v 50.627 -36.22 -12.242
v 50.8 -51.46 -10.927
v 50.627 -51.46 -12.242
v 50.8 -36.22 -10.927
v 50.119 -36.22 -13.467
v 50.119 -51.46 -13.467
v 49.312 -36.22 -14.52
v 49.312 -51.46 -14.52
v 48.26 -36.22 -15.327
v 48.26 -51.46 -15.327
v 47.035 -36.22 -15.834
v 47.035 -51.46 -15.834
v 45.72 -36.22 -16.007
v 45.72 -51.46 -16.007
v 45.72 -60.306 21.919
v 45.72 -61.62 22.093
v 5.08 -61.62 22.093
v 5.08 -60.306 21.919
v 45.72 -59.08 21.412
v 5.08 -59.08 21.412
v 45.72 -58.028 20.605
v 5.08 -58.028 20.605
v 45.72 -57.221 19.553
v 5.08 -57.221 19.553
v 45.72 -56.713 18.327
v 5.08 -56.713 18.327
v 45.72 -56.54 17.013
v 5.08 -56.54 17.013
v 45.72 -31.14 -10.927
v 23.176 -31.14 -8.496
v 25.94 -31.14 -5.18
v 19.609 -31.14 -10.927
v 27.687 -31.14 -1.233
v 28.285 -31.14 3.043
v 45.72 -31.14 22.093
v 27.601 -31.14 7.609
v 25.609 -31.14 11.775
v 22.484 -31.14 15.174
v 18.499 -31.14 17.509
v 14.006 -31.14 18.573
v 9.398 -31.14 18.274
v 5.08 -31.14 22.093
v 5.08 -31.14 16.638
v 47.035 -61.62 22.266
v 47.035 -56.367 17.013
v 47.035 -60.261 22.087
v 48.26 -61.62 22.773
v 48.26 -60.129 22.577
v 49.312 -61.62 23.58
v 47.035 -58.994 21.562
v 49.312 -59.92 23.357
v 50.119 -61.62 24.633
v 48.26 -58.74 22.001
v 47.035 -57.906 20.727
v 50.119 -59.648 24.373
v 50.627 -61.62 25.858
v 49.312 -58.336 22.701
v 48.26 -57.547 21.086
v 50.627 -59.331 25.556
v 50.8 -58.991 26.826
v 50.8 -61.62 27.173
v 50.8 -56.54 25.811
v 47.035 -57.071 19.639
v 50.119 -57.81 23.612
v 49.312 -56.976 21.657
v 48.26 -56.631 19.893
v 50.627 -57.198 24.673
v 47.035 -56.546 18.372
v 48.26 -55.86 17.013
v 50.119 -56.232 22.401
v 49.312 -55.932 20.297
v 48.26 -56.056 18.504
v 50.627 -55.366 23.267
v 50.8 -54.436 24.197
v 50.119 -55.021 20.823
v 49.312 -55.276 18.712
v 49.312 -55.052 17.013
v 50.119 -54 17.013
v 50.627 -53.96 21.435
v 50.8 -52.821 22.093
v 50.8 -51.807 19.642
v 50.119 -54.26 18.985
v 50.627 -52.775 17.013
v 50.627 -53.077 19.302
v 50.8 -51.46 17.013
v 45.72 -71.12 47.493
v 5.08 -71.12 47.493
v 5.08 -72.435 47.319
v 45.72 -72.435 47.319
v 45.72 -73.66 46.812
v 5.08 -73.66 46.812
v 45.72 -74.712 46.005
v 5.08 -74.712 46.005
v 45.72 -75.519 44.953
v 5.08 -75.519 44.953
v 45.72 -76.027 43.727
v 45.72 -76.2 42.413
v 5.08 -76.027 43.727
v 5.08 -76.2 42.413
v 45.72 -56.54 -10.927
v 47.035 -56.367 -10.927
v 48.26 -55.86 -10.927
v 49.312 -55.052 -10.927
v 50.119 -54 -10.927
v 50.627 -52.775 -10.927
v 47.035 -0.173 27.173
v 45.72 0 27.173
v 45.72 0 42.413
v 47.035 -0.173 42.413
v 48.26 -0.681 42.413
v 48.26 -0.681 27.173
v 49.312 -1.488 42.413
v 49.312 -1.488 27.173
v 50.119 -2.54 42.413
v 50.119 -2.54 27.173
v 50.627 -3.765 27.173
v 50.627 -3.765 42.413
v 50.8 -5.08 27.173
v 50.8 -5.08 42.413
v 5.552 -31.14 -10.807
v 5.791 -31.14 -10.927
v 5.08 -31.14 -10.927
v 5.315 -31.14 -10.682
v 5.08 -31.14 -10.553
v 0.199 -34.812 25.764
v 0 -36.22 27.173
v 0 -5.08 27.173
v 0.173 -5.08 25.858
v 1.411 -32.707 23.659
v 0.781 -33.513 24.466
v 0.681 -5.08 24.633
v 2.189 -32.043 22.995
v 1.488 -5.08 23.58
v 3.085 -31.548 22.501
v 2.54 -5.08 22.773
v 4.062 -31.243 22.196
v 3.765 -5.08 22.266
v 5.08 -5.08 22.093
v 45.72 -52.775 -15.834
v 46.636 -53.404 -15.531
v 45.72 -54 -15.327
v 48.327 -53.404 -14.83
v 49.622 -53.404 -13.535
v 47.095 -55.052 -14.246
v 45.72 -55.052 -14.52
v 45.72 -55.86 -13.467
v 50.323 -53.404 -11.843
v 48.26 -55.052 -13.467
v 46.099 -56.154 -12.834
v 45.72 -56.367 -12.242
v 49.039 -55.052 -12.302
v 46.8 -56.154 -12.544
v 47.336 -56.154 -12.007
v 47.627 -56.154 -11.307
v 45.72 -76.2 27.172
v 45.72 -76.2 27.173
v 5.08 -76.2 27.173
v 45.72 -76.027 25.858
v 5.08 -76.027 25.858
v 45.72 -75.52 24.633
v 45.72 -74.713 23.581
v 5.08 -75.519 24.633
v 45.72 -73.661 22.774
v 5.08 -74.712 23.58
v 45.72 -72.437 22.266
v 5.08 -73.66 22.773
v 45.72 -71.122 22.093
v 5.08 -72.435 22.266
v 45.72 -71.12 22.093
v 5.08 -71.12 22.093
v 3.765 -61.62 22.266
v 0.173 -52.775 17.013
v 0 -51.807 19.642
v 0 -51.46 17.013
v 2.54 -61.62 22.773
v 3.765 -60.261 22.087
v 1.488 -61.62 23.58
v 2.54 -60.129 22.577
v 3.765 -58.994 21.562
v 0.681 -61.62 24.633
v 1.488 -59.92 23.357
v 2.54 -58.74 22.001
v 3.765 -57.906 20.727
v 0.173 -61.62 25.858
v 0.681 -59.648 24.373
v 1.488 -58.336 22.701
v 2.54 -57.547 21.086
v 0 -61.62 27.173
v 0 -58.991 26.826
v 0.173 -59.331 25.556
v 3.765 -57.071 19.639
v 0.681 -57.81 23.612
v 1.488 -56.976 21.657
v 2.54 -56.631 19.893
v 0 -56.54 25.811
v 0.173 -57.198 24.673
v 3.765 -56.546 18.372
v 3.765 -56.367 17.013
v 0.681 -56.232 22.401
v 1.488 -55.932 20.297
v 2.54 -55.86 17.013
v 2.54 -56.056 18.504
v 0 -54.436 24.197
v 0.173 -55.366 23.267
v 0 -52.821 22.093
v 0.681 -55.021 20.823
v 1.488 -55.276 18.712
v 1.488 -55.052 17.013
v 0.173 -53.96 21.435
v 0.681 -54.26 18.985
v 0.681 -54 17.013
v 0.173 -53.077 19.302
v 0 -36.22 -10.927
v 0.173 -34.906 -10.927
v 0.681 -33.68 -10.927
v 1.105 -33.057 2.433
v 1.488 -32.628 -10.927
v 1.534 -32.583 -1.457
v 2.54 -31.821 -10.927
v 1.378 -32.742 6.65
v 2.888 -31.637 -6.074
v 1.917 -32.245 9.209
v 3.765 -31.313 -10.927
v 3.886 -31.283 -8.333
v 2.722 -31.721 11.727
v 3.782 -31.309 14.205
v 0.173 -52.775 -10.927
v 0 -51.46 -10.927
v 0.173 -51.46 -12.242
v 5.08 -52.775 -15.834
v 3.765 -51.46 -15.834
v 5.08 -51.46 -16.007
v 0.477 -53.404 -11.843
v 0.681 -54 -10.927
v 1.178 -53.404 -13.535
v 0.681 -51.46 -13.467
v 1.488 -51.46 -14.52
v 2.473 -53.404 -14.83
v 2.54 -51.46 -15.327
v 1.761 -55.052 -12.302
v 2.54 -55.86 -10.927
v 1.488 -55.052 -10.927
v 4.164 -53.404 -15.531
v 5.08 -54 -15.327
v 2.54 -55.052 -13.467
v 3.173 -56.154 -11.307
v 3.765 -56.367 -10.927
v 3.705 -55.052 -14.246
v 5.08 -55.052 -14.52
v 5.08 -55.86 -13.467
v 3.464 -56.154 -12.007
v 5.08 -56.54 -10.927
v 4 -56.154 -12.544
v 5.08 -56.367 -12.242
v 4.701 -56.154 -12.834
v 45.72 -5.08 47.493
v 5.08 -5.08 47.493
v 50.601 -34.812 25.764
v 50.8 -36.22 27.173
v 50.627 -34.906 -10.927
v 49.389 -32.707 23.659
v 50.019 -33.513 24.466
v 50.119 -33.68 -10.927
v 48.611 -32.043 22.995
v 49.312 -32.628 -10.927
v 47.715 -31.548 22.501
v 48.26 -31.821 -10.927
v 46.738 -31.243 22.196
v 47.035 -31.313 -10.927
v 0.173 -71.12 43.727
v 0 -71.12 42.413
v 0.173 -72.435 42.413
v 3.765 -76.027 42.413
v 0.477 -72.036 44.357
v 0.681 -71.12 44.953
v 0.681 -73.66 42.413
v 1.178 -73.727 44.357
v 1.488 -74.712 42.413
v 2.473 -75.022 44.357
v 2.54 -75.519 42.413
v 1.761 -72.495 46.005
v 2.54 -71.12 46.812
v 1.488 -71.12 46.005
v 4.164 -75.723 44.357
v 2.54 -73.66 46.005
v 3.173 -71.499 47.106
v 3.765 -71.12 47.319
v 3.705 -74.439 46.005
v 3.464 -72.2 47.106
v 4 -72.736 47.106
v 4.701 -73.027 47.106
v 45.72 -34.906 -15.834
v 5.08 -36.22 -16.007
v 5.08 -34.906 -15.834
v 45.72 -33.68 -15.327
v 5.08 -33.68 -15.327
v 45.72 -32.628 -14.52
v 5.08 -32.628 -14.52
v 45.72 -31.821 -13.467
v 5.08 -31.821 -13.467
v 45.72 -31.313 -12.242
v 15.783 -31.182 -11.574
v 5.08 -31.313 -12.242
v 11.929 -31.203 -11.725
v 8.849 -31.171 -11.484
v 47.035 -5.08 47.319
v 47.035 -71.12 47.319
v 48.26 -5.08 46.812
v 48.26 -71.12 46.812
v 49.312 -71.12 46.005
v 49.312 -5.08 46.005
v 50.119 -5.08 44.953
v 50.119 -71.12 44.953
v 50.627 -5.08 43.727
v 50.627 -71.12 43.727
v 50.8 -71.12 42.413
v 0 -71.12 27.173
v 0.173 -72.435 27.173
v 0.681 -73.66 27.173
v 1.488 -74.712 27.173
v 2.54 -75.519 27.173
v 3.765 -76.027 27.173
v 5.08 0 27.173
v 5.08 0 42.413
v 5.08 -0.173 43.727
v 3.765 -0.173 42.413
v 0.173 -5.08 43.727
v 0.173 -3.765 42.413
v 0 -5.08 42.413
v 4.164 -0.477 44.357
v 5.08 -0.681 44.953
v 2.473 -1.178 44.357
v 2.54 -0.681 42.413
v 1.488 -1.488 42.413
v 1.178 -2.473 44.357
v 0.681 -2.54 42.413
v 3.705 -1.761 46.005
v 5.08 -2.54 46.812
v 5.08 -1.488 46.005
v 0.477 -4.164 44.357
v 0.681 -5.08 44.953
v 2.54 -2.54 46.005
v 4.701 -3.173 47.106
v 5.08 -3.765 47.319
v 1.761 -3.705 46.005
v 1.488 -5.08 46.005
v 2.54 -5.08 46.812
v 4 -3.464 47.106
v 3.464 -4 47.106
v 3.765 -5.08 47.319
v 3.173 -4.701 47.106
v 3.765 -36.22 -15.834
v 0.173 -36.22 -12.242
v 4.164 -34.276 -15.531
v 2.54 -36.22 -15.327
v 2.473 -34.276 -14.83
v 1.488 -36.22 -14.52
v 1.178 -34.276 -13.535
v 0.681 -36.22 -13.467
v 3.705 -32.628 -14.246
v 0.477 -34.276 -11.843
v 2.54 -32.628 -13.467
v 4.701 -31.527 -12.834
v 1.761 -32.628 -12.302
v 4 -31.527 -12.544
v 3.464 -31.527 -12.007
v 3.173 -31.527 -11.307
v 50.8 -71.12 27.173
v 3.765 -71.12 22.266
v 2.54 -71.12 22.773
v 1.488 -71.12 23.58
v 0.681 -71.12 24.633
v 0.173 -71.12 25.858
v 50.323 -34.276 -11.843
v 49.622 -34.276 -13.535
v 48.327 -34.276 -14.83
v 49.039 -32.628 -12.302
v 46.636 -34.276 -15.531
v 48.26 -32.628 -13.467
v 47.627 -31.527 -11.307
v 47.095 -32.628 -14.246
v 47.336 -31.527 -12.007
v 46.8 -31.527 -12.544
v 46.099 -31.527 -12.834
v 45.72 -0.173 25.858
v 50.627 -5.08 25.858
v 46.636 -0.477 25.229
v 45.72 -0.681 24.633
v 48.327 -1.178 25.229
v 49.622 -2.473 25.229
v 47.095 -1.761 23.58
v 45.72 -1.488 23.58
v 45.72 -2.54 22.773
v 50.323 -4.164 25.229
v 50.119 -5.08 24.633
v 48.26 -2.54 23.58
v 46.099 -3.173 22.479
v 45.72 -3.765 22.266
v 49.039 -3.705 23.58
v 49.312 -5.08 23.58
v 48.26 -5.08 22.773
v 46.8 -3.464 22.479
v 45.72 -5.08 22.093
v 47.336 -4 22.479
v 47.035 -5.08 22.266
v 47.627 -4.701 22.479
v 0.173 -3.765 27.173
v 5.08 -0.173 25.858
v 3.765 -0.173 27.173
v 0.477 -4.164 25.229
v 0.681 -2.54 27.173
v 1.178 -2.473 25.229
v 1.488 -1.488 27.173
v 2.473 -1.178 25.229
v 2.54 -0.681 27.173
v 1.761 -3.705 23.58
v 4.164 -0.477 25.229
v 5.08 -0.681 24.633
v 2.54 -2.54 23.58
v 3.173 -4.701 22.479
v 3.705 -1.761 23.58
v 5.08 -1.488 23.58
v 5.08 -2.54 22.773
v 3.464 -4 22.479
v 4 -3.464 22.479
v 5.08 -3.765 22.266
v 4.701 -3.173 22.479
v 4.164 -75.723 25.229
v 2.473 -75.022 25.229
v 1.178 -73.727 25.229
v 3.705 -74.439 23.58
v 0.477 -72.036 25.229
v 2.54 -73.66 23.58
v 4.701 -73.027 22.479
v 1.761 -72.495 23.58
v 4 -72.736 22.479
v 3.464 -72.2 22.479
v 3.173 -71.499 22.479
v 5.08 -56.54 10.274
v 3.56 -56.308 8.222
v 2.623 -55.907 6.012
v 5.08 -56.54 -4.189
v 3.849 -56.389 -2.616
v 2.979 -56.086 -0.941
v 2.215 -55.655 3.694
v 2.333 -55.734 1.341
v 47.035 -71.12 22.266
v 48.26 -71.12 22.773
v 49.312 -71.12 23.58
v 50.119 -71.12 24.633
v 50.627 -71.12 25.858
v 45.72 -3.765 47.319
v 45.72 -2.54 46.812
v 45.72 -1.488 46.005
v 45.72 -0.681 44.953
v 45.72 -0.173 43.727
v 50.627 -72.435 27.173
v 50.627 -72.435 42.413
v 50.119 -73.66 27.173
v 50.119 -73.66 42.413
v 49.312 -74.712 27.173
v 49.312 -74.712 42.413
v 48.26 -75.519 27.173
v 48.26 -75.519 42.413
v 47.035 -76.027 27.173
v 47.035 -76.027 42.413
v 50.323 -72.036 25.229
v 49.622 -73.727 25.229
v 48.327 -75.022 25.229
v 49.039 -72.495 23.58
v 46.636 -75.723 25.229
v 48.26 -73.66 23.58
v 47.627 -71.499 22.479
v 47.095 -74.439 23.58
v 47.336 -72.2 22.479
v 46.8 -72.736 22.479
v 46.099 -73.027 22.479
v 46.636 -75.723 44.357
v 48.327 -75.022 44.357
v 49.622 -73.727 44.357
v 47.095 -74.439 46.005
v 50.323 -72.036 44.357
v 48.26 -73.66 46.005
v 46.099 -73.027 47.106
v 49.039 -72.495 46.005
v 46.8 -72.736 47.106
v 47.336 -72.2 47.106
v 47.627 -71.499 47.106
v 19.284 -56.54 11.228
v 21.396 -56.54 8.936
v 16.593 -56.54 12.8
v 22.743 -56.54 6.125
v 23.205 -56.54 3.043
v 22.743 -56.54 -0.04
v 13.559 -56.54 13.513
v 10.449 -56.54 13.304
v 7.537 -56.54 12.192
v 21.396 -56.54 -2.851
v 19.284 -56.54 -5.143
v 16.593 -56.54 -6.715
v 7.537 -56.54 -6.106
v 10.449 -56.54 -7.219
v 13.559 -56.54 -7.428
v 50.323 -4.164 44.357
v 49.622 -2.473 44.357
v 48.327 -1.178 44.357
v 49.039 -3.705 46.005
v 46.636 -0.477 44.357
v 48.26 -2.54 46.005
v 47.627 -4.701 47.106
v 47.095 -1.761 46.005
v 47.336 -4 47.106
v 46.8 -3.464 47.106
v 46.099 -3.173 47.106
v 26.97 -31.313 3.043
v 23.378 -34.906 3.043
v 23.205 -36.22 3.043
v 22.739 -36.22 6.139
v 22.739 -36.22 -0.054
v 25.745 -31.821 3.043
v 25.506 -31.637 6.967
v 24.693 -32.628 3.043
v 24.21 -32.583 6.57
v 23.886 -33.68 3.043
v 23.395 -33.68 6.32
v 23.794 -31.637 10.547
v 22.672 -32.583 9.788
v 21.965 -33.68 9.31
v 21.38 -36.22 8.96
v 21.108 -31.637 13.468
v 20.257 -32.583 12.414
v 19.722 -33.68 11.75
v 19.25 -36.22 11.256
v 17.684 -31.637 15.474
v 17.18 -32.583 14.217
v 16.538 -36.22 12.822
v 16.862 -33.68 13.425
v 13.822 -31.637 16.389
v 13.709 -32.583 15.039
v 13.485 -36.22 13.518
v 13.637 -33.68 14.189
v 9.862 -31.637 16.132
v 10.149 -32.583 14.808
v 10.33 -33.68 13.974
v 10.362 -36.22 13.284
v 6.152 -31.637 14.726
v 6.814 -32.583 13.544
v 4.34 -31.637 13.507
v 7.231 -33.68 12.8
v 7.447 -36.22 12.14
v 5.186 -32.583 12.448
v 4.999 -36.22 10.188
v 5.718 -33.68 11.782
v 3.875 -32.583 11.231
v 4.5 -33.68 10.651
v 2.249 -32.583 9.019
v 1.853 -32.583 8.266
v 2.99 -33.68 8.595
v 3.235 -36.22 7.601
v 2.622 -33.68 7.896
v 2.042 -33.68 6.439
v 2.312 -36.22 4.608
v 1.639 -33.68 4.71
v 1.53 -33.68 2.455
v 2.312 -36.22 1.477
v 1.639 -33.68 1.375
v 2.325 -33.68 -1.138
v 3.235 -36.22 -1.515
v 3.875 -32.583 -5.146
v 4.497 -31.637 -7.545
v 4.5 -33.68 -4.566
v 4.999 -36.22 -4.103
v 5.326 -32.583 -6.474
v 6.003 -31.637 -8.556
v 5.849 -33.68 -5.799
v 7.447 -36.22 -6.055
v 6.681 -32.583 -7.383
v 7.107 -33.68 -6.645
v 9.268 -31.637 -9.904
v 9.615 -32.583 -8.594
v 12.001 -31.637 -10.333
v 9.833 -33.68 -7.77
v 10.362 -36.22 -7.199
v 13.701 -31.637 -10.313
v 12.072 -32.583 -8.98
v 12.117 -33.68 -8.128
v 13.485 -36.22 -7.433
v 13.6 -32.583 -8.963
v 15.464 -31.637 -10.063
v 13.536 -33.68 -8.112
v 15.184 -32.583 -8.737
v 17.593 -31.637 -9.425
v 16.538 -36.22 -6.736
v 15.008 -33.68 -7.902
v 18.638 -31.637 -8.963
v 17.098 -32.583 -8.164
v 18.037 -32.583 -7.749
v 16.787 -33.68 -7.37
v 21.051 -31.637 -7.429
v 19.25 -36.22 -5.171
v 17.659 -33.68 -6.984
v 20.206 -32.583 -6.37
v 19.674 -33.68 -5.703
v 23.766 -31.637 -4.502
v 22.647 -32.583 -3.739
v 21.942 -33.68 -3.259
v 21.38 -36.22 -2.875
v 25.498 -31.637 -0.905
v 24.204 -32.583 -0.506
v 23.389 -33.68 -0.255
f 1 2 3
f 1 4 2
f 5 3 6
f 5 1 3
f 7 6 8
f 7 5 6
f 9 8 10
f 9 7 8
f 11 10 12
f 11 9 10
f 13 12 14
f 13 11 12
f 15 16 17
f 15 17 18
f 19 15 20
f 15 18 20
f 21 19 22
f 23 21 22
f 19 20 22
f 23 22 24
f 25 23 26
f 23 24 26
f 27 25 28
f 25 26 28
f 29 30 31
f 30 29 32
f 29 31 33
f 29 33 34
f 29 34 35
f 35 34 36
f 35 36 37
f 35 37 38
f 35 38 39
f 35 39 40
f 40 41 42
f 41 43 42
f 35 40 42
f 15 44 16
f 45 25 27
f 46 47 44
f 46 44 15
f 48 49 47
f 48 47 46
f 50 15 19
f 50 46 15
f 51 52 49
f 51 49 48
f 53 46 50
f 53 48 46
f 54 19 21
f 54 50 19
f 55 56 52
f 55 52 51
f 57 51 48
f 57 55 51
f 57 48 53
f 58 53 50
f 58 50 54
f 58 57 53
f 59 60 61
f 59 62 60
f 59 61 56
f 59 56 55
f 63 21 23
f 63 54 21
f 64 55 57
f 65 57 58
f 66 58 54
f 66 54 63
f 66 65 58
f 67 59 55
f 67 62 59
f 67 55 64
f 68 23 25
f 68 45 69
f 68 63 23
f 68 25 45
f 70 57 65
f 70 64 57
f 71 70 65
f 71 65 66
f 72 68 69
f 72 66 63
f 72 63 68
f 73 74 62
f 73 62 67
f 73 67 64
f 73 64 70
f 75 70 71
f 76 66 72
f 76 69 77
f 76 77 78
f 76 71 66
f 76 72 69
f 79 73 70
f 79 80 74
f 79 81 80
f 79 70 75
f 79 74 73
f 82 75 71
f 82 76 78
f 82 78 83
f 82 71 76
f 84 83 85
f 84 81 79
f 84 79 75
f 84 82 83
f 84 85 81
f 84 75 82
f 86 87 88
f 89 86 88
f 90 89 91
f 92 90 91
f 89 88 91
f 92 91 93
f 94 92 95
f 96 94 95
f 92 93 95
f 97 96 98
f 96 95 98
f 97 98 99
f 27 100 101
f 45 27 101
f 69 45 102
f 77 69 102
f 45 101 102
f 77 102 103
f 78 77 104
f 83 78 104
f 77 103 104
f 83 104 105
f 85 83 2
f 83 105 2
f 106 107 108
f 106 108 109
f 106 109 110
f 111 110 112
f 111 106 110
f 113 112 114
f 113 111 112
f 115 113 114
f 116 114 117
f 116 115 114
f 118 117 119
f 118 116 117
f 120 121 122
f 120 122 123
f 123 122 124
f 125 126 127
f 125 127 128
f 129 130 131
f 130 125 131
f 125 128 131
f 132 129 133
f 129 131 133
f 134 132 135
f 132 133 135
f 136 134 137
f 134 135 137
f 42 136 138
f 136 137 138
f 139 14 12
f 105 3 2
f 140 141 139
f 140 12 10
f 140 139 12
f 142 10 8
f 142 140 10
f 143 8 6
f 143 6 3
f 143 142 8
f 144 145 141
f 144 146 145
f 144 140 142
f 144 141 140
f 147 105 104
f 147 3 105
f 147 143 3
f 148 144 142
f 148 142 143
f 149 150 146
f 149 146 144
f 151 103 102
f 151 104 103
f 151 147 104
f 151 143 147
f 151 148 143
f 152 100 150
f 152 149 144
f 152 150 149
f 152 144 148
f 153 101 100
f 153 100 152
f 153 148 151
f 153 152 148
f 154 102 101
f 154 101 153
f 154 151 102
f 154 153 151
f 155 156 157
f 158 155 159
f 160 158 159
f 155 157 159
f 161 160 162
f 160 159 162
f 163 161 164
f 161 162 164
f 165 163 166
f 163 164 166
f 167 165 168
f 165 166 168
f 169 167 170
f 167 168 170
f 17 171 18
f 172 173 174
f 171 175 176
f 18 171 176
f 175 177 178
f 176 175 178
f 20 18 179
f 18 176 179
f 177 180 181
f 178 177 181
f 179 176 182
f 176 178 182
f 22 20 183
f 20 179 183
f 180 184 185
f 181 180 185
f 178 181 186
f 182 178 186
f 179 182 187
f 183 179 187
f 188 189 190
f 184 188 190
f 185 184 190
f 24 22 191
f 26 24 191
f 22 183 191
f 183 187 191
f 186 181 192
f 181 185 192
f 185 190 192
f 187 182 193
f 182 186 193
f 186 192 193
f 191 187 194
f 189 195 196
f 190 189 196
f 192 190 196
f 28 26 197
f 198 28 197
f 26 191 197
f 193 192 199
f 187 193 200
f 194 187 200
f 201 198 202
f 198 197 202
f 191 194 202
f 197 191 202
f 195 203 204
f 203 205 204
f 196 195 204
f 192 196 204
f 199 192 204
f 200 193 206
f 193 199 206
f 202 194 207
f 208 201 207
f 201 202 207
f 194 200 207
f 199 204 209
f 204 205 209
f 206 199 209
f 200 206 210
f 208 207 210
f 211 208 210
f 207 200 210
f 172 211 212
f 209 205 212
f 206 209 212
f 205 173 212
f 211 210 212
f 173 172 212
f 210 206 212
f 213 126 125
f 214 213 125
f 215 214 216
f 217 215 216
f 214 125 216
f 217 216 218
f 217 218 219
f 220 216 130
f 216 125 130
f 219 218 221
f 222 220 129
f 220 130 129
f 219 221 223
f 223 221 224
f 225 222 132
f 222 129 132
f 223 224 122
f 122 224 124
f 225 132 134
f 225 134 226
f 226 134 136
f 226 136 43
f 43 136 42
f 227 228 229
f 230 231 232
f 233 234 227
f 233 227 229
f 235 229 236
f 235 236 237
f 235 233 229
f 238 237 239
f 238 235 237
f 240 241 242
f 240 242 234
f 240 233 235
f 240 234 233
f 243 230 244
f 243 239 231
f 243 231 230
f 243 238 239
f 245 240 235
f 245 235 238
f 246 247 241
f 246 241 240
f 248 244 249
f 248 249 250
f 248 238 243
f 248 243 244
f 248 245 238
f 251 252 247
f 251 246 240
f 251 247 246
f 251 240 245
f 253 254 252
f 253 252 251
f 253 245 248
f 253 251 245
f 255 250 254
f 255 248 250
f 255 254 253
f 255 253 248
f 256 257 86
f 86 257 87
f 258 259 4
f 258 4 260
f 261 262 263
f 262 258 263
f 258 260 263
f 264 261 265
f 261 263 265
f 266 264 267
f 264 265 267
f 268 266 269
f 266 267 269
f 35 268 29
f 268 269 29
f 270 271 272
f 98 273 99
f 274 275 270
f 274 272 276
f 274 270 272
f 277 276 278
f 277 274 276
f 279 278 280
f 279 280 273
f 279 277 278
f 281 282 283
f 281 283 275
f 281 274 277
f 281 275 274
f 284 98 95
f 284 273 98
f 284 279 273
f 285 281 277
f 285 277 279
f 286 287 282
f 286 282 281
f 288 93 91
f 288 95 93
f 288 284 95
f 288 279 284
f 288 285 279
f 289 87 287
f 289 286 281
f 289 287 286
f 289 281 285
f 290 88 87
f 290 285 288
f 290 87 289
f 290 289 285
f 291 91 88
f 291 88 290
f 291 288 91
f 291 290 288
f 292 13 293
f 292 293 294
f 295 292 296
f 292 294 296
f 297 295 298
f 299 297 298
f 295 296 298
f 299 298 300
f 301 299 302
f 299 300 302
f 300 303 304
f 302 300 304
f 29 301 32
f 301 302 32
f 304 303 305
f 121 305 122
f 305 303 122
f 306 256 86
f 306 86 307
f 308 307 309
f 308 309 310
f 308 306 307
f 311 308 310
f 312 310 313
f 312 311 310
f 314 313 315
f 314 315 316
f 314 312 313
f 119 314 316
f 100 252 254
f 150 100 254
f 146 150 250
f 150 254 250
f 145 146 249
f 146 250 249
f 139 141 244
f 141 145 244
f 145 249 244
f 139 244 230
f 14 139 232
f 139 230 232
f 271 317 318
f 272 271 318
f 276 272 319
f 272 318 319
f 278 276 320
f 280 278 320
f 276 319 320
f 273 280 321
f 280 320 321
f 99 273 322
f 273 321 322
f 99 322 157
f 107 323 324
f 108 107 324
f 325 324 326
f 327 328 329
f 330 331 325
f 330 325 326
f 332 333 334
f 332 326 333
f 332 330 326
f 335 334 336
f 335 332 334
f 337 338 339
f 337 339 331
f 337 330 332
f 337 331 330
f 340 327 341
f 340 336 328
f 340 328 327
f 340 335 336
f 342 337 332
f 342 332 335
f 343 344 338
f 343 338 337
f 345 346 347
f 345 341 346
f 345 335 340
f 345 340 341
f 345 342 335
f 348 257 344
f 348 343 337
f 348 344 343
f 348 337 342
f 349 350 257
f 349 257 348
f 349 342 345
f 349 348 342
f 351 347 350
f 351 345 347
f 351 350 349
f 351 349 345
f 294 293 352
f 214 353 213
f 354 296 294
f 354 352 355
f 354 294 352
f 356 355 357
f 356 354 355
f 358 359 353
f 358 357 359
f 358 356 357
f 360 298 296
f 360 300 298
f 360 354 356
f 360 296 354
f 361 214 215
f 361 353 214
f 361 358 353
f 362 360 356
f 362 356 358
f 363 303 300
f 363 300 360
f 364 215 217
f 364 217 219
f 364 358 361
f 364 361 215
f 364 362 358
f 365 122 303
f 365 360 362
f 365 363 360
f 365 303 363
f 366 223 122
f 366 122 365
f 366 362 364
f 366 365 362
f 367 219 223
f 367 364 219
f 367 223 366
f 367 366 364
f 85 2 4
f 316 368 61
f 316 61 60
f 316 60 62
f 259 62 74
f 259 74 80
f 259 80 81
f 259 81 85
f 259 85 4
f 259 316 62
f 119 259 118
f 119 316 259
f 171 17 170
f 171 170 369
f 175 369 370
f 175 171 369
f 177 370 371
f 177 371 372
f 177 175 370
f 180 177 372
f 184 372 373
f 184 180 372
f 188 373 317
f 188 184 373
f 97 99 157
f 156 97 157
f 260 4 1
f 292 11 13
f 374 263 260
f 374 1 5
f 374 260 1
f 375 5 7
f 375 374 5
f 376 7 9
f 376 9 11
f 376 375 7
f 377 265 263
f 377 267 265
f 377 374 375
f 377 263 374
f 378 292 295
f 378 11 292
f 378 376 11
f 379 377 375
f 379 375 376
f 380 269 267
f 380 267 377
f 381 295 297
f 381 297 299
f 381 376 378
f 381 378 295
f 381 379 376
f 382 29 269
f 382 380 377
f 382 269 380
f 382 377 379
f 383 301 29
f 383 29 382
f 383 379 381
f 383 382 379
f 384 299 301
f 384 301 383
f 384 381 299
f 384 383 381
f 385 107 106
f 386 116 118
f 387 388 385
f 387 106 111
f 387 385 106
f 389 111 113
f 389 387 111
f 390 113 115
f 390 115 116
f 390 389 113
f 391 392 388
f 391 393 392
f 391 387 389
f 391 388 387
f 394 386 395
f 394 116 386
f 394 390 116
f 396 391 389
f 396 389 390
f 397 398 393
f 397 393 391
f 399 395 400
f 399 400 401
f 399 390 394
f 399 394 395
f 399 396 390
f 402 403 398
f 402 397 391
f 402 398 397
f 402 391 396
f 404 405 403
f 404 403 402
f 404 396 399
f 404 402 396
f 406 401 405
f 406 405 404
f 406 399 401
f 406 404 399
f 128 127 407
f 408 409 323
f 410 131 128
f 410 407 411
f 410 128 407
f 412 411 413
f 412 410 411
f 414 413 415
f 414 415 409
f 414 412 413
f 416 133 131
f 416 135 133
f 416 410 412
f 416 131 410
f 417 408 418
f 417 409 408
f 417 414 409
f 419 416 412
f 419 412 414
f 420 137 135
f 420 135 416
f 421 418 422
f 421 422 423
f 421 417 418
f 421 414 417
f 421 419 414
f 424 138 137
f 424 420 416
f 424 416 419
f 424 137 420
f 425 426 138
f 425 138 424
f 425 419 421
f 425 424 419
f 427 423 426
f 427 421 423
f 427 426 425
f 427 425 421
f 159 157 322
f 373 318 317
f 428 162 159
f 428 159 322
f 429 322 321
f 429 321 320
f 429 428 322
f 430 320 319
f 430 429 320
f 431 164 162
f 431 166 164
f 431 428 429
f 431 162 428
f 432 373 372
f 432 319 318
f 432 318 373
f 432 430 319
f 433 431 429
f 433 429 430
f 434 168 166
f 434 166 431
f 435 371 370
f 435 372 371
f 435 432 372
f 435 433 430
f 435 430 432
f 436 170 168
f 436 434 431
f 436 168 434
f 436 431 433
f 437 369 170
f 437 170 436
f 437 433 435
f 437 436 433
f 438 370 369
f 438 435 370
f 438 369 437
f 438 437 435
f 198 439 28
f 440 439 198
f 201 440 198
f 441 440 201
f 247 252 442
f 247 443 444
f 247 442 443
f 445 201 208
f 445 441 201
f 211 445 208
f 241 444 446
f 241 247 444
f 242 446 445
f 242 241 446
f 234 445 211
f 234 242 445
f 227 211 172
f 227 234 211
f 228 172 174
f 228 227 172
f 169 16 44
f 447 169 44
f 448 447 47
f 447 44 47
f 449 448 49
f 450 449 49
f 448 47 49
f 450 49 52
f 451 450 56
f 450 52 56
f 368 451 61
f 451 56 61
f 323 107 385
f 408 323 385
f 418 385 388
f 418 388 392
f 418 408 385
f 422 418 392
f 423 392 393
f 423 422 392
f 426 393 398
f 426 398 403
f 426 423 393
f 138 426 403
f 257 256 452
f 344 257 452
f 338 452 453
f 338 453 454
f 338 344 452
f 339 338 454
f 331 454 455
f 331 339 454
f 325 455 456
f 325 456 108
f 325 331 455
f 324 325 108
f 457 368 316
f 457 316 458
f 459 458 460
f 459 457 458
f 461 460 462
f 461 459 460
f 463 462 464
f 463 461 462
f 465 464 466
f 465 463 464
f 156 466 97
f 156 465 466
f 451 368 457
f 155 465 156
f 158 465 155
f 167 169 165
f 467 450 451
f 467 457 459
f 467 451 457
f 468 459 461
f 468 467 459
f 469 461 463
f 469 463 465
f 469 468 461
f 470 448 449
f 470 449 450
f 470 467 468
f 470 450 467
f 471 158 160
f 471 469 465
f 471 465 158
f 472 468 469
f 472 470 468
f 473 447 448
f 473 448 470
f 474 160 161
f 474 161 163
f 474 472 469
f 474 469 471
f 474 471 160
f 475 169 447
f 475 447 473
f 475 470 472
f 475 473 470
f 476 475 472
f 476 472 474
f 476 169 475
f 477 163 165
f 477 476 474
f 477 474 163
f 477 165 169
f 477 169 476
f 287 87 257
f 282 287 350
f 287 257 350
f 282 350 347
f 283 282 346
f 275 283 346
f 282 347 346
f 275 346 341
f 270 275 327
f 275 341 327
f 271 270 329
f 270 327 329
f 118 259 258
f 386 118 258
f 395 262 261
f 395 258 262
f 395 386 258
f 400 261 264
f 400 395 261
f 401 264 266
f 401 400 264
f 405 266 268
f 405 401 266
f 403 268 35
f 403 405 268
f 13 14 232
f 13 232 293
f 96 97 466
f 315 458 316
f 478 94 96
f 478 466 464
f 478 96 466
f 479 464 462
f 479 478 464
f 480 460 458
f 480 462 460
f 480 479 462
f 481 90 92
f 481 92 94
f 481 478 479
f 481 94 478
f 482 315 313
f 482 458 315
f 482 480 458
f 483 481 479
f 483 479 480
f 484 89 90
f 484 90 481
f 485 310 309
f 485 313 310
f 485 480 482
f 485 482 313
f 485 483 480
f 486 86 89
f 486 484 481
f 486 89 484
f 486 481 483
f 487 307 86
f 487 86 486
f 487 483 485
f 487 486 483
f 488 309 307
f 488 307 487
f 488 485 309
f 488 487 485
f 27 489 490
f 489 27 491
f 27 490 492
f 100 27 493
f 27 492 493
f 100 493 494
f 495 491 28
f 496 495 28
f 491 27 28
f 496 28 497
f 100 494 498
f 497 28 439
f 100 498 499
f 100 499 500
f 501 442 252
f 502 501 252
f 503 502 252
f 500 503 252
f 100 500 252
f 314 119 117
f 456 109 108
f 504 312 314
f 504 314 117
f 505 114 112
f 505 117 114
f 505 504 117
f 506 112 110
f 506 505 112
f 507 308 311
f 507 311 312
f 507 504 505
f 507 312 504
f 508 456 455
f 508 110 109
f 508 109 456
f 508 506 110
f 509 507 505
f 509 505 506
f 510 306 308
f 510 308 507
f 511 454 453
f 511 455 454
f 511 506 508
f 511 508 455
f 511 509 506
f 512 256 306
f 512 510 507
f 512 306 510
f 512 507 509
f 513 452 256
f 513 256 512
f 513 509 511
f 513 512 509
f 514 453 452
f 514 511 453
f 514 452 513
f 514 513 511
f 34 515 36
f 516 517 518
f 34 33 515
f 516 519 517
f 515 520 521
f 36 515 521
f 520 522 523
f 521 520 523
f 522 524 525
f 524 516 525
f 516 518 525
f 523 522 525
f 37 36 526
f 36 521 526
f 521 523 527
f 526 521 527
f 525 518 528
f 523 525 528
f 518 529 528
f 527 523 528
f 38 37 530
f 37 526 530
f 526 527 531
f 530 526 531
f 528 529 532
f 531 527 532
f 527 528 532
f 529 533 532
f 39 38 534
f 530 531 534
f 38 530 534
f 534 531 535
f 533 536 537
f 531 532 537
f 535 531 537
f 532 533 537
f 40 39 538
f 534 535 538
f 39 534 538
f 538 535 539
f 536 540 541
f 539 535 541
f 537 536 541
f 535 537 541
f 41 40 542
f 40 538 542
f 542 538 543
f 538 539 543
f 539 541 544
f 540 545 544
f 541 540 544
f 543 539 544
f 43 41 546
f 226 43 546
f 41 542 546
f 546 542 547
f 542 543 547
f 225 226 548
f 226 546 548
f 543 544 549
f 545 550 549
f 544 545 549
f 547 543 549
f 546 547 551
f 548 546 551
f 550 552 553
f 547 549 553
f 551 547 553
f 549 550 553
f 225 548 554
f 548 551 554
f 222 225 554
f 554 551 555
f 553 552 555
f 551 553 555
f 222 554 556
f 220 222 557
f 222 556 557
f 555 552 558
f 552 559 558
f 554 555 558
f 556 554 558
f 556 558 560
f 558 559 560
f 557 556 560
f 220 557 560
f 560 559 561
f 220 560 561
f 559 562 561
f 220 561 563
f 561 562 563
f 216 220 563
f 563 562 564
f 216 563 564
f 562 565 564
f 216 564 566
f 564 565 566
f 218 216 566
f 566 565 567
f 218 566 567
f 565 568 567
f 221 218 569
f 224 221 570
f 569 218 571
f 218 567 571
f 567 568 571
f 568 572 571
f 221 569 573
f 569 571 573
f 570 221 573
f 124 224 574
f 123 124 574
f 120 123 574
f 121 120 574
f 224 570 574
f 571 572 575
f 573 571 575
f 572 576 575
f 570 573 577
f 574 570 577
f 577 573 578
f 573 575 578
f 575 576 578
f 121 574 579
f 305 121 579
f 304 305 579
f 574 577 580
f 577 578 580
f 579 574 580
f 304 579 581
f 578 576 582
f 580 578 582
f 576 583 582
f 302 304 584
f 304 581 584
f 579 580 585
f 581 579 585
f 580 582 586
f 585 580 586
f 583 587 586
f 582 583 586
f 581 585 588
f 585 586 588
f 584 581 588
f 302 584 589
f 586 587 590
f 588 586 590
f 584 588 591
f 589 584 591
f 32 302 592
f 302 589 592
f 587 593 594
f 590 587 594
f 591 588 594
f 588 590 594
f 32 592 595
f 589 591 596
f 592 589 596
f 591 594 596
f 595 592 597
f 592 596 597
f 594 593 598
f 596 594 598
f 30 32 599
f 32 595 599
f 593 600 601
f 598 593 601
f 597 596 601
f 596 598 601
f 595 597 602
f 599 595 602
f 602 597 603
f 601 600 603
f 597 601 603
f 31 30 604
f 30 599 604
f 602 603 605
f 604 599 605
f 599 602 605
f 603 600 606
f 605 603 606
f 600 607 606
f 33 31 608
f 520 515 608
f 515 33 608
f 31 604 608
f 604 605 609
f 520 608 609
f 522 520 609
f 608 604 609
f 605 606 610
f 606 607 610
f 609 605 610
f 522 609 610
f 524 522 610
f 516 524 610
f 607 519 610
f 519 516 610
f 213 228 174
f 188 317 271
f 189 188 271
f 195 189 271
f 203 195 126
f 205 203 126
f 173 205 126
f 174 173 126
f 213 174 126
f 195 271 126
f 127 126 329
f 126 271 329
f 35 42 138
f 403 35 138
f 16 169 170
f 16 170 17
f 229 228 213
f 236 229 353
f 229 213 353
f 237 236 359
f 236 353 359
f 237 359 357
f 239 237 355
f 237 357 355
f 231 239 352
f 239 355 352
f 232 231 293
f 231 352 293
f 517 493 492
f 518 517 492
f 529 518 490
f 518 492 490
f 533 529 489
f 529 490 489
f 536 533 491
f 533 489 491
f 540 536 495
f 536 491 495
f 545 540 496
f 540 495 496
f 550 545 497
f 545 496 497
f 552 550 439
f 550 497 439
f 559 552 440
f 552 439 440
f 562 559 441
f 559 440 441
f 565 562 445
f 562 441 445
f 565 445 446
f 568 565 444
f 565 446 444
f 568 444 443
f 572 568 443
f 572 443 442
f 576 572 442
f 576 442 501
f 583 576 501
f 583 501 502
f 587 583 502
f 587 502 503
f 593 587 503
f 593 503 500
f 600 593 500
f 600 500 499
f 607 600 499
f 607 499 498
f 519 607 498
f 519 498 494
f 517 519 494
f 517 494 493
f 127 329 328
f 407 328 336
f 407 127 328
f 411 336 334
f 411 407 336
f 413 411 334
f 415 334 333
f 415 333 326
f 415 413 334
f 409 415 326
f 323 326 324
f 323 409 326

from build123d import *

# Parameters (mm, degrees)
F0_W          = 25.4
F0_H          = 25.4
F1_DEPTH      = 76.2
F2_W          = 25.4
F2_H          = 25.4
F3_DEPTH      = 38.1
F4_R          = 10.5052255275
F5_DEPTH      = 56.5413178334
F7_DEPTH      = 25.4
F8_T1_DEPTH   = 50.8
F8_T3_DEPTH   = 33.02
F8_T5_DEPTH   = 33.02
F8_T7_DEPTH   = 26.0603178334
F8_T9_DEPTH   = 15.24
F8_T11_DEPTH  = 66.04
F8_T13_DEPTH  = 33.02
F8_T15_DEPTH  = 76.2
F8_T17_DEPTH  = 40.64
F8_S21_W      = 5.08
F8_S21_H      = 5.08
F8_T22_DEPTH  = 5.08
F8_S27_W      = 5.08
F8_S27_H      = 5.08
F8_T28_DEPTH  = 5.08
F8_S33_W      = 5.08
F8_S33_H      = 5.08
F8_T34_DEPTH  = 5.08
F8_S39_W      = 5.08
F8_S39_H      = 5.08
F8_T40_DEPTH  = 5.08
F8_S45_W      = 5.08
F8_S45_H      = 5.08
F8_T46_DEPTH  = 5.08
F8_S51_W      = 5.08
F8_S51_H      = 5.08
F8_T52_DEPTH  = 5.08
F8_S57_W      = 5.08
F8_S57_H      = 5.08
F8_T58_DEPTH  = 5.08
F8_S63_W      = 5.08
F8_S63_H      = 5.08
F8_T64_DEPTH  = 5.08
F8_T73_DEPTH  = 45.72
F8_T77_DEPTH  = 38.7603178334
F8_T84_DEPTH  = 45.72
F8_T88_DEPTH  = 38.7603178334
F8_T91_DEPTH  = 27.94
F8_T93_DEPTH  = 9.4996821666
F8_S97_W      = 5.08
F8_S97_H      = 5.08
F8_T98_DEPTH  = 5.08
F8_S103_W     = 5.08
F8_S103_H     = 5.08
F8_T104_DEPTH = 5.08
F8_S109_W     = 5.08
F8_S109_H     = 5.08
F8_T110_DEPTH = 5.08
F8_S115_W     = 5.08
F8_S115_H     = 5.08
F8_T116_DEPTH = 5.08
F8_T120_ANGLE = 90
F8_T122_ANGLE = 90


# Not quite as in the source:
# - a fillet or chamfer that OpenCascade refuses, or shapes differently, is made with other operations: its cross-section is extruded or revolved along the edge and cut away or added


with BuildPart() as f1:
    # F0 (on Front) → F1 (new body)
    with BuildSketch(Plane.XZ):
        with Locations((12.7, 34.7925674498)):
            Rectangle(F0_W, F0_H)
    extrude(amount=F1_DEPTH)

    # F2 (on face) → F3 (join)
    with BuildSketch(Plane(origin=(0, 0, 22.0925674498), x_dir=(1, 0, 0), z_dir=(0, 0, -1))):
        with Locations((12.7, 43.8403178334)):
            Rectangle(F2_W, F2_H)
    extrude(amount=F3_DEPTH)

    # F4 (on face) → F5 (cut, through all)
    with BuildSketch(Plane.XZ.offset(56.5403178334)):
        with Locations((12.7, 3.0425674498)):
            Circle(F4_R)
    extrude(amount=-F5_DEPTH, mode=Mode.SUBTRACT)

    # F6 (on face) → F7 (join)
    with BuildSketch(Plane.YZ.offset(25.4)):
        Polygon((-31.1403178334, -16.0074325502), (-31.1403178334, 22.0925674498), (0, 22.0925674498), (0, 47.4925674498), (-76.2, 47.4925674498), (-76.2, 22.0925674498), (-56.5403178334, 22.0925674498), (-56.5403178334, -16.0074325502), align=None)
    extrude(amount=F7_DEPTH)

    # F8: fillet of radius 5.08 on 24 edges, made by hand

    # F8_s2 → F8_t1 (join)
    with BuildSketch(Plane.YZ):
        with BuildLine():
            ThreePointArc((-61.6203178334, 22.0925674498), (-58.028215385, 20.6046698982), (-56.5403178334, 17.0125674498))
            Line((-56.5403178334, 17.0125674498), (-56.5403178334, 22.0925674498))
            Line((-56.5403178334, 22.0925674498), (-61.6203178334, 22.0925674498))
        make_face()
    extrude(amount=F8_T1_DEPTH)

    # F8_s4 → F8_t3 (cut)
    with BuildSketch(Plane.XZ.offset(36.2203178334)):
        with BuildLine():
            ThreePointArc((50.8, -10.9274325502), (49.3121024484, -14.5195349986), (45.72, -16.0074325502))
            Line((45.72, -16.0074325502), (50.8, -16.0074325502))
            Line((50.8, -16.0074325502), (50.8, -10.9274325502))
        make_face()
        with BuildLine():
            ThreePointArc((0, -10.9274325502), (1.4878975516, -14.5195349986), (5.08, -16.0074325502))
            Line((5.08, -16.0074325502), (0, -16.0074325502))
            Line((0, -16.0074325502), (0, -10.9274325502))
        make_face()
    extrude(amount=F8_T3_DEPTH, mode=Mode.SUBTRACT)

    # F8_s6 → F8_t5 (cut)
    with BuildSketch(Plane.XY.offset(-10.9274325502)):
        with BuildLine():
            ThreePointArc((50.8, -36.2203178334), (49.3121024484, -32.628215385), (45.72, -31.1403178334))
            Line((45.72, -31.1403178334), (50.8, -31.1403178334))
            Line((50.8, -31.1403178334), (50.8, -36.2203178334))
        make_face()
        with BuildLine():
            ThreePointArc((0, -36.2203178334), (1.4878975516, -32.628215385), (5.08, -31.1403178334))
            Line((5.08, -31.1403178334), (0, -31.1403178334))
            Line((0, -31.1403178334), (0, -36.2203178334))
        make_face()
    extrude(amount=F8_T5_DEPTH, mode=Mode.SUBTRACT)

    # F8_s8 → F8_t7 (cut)
    with BuildSketch(Plane.XZ.offset(5.08)):
        with BuildLine():
            ThreePointArc((50.8, 27.1725674498), (49.3121024484, 23.5804650014), (45.72, 22.0925674498))
            Line((45.72, 22.0925674498), (50.8, 22.0925674498))
            Line((50.8, 22.0925674498), (50.8, 27.1725674498))
        make_face()
        with BuildLine():
            ThreePointArc((0, 27.1725674498), (1.4878975516, 23.5804650014), (5.08, 22.0925674498))
            Line((5.08, 22.0925674498), (0, 22.0925674498))
            Line((0, 22.0925674498), (0, 27.1725674498))
        make_face()
    extrude(amount=F8_T7_DEPTH, mode=Mode.SUBTRACT)

    # F8_s10 → F8_t9 (cut)
    with BuildSketch(Plane.XY.offset(27.1725674498)):
        with BuildLine():
            ThreePointArc((45.72, 0), (49.3121024484, -1.4878975516), (50.8, -5.08))
            Line((50.8, -5.08), (50.8, 0))
            Line((50.8, 0), (45.72, 0))
        make_face()
        with BuildLine():
            ThreePointArc((0, -5.08), (1.4878975516, -1.4878975516), (5.08, 0))
            Line((5.08, 0), (0, 0))
            Line((0, 0), (0, -5.08))
        make_face()
    extrude(amount=F8_T9_DEPTH, mode=Mode.SUBTRACT)

    # F8_s12 → F8_t11 (cut)
    with BuildSketch(Plane.XZ.offset(5.08)):
        with BuildLine():
            ThreePointArc((45.72, 47.4925674498), (49.3121024484, 46.0046698982), (50.8, 42.4125674498))
            Line((50.8, 42.4125674498), (50.8, 47.4925674498))
            Line((50.8, 47.4925674498), (45.72, 47.4925674498))
        make_face()
        with BuildLine():
            ThreePointArc((5.08, 47.4925674498), (1.4878975516, 46.0046698982), (0, 42.4125674498))
            Line((0, 42.4125674498), (0, 47.4925674498))
            Line((0, 47.4925674498), (5.08, 47.4925674498))
        make_face()
    extrude(amount=F8_T11_DEPTH, mode=Mode.SUBTRACT)

    # F8_s14 → F8_t13 (cut)
    with BuildSketch(Plane.XY.offset(9.3925674498)):
        with BuildLine():
            ThreePointArc((50.8, -71.12), (49.3121024484, -74.7121024484), (45.72, -76.2))
            Line((45.72, -76.2), (50.8, -76.2))
            Line((50.8, -76.2), (50.8, -71.12))
        make_face()
        with BuildLine():
            ThreePointArc((0, -71.12), (1.4878975516, -74.7121024484), (5.08, -76.2))
            Line((5.08, -76.2), (0, -76.2))
            Line((0, -76.2), (0, -71.12))
        make_face()
    extrude(amount=F8_T13_DEPTH, mode=Mode.SUBTRACT)

    # F8_s16 → F8_t15 (cut)
    with BuildSketch(Plane.YZ.offset(-12.7)):
        with BuildLine():
            ThreePointArc((-56.5403178334, -10.9274325502), (-55.0524202819, -14.5195349986), (-51.4603178334, -16.0074325502))
            Line((-51.4603178334, -16.0074325502), (-56.5403178334, -16.0074325502))
            Line((-56.5403178334, -16.0074325502), (-56.5403178334, -10.9274325502))
        make_face()
        with BuildLine():
            ThreePointArc((-76.2, 27.1725674498), (-74.7121024484, 23.5804650014), (-71.12, 22.0925674498))
            Line((-71.12, 22.0925674498), (-76.2, 22.0925674498))
            Line((-76.2, 22.0925674498), (-76.2, 27.1725674498))
        make_face()
    extrude(amount=F8_T15_DEPTH, mode=Mode.SUBTRACT)

    # F8_s18 → F8_t17 (cut)
    with BuildSketch(Plane.YZ.offset(5.08)):
        with BuildLine():
            ThreePointArc((0, 27.1725674498), (-1.4878975516, 23.5804650014), (-5.08, 22.0925674498))
            Line((-5.08, 22.0925674498), (0, 22.0925674498))
            Line((0, 22.0925674498), (0, 27.1725674498))
        make_face()
        with BuildLine():
            ThreePointArc((-36.2203178334, -16.0074325502), (-32.628215385, -14.5195349986), (-31.1403178334, -10.9274325502))
            Line((-31.1403178334, -10.9274325502), (-31.1403178334, -16.0074325502))
            Line((-31.1403178334, -16.0074325502), (-36.2203178334, -16.0074325502))
        make_face()
        with BuildLine():
            ThreePointArc((-5.08, 47.4925674498), (-1.4878975516, 46.0046698982), (0, 42.4125674498))
            Line((0, 42.4125674498), (0, 47.4925674498))
            Line((0, 47.4925674498), (-5.08, 47.4925674498))
        make_face()
        with BuildLine():
            ThreePointArc((-71.12, 47.4925674498), (-74.7121024484, 46.0046698982), (-76.2, 42.4125674498))
            Line((-76.2, 42.4125674498), (-76.2, 47.4925674498))
            Line((-76.2, 47.4925674498), (-71.12, 47.4925674498))
        make_face()
    extrude(amount=F8_T17_DEPTH, mode=Mode.SUBTRACT)


with BuildPart() as f8_tool20:
    # F8_s21 → F8_t22 (new body)
    with BuildSketch(Plane.XZ.offset(36.2203178334)):
        with Locations((48.26, -13.4674325502)):
            Rectangle(F8_S21_W, F8_S21_H)
    extrude(amount=-F8_T22_DEPTH)

    # F8_s23 → F8_t24 (revolve, cut)
    with BuildSketch(Plane(origin=(45.72, -36.2203178334, -10.9274325502), x_dir=(-0.7071067812, 0, 0.7071067812), z_dir=(-0.7071067812, 0, -0.7071067812))):
        with BuildLine():
            ThreePointArc((0, -5.08), (5.08, 0), (0, 5.08))
            Line((0, 5.08), (0, -5.08))
        make_face()
    revolve(axis=Axis((45.72, -36.2203178334, -10.9274325502), (0, 1, 0)), mode=Mode.SUBTRACT)


with BuildPart() as f1_1:
    add(f1.part)

    # F8_t19: cut F8_tool20
    add(f8_tool20.part, mode=Mode.SUBTRACT)


with BuildPart() as f8_tool26:
    # F8_s27 → F8_t28 (new body)
    with BuildSketch(Plane.XY.offset(27.1725674498)):
        with Locations((48.26, -2.54)):
            Rectangle(F8_S27_W, F8_S27_H)
    extrude(amount=-F8_T28_DEPTH)

    # F8_s29 → F8_t30 (revolve, cut)
    with BuildSketch(Plane(origin=(45.72, -5.08, 27.1725674498), x_dir=(-0.7071067812, -0.7071067812, 0), z_dir=(0.7071067812, -0.7071067812, 0))):
        with BuildLine():
            ThreePointArc((0, -5.08), (5.08, 0), (0, 5.08))
            Line((0, 5.08), (0, -5.08))
        make_face()
    revolve(axis=Axis((45.72, -5.08, 27.1725674498), (0, 0, -1)), mode=Mode.SUBTRACT)


with BuildPart() as f1_2:
    add(f1_1.part)

    # F8_t25: cut F8_tool26
    add(f8_tool26.part, mode=Mode.SUBTRACT)


with BuildPart() as f8_tool32:
    # F8_s33 → F8_t34 (new body)
    with BuildSketch(Plane.XY.offset(42.4125674498)):
        with Locations((48.26, -2.54)):
            Rectangle(F8_S33_W, F8_S33_H)
    extrude(amount=F8_T34_DEPTH)

    # F8_s35 → F8_t36 (revolve, cut)
    with BuildSketch(Plane(origin=(45.72, -5.08, 42.4125674498), x_dir=(-0.7071067812, -0.7071067812, 0), z_dir=(-0.7071067812, 0.7071067812, 0))):
        with BuildLine():
            ThreePointArc((0, -5.08), (5.08, 0), (0, 5.08))
            Line((0, 5.08), (0, -5.08))
        make_face()
    revolve(axis=Axis((45.72, -5.08, 42.4125674498), (0, 0, 1)), mode=Mode.SUBTRACT)


with BuildPart() as f1_3:
    add(f1_2.part)

    # F8_t31: cut F8_tool32
    add(f8_tool32.part, mode=Mode.SUBTRACT)


with BuildPart() as f8_tool38:
    # F8_s39 → F8_t40 (new body)
    with BuildSketch(Plane.XY.offset(42.4125674498)):
        with Locations((48.26, -73.66)):
            Rectangle(F8_S39_W, F8_S39_H)
    extrude(amount=F8_T40_DEPTH)

    # F8_s41 → F8_t42 (revolve, cut)
    with BuildSketch(Plane(origin=(45.72, -71.12, 42.4125674498), x_dir=(-0.7071067812, 0.7071067812, 0), z_dir=(0.7071067812, 0.7071067812, 0))):
        with BuildLine():
            ThreePointArc((0, -5.08), (5.08, 0), (0, 5.08))
            Line((0, 5.08), (0, -5.08))
        make_face()
    revolve(axis=Axis((45.72, -71.12, 42.4125674498), (0, 0, 1)), mode=Mode.SUBTRACT)


with BuildPart() as f1_4:
    add(f1_3.part)

    # F8_t37: cut F8_tool38
    add(f8_tool38.part, mode=Mode.SUBTRACT)


with BuildPart() as f8_tool44:
    # F8_s45 → F8_t46 (new body)
    with BuildSketch(Plane.XY.offset(27.1725674498)):
        with Locations((2.54, -2.54)):
            Rectangle(F8_S45_W, F8_S45_H)
    extrude(amount=-F8_T46_DEPTH)

    # F8_s47 → F8_t48 (revolve, cut)
    with BuildSketch(Plane(origin=(5.08, -5.08, 27.1725674498), x_dir=(0.7071067812, -0.7071067812, 0), z_dir=(0.7071067812, 0.7071067812, 0))):
        with BuildLine():
            ThreePointArc((0, -5.08), (5.08, 0), (0, 5.08))
            Line((0, 5.08), (0, -5.08))
        make_face()
    revolve(axis=Axis((5.08, -5.08, 27.1725674498), (0, 0, -1)), mode=Mode.SUBTRACT)


with BuildPart() as f1_5:
    add(f1_4.part)

    # F8_t43: cut F8_tool44
    add(f8_tool44.part, mode=Mode.SUBTRACT)


with BuildPart() as f8_tool50:
    # F8_s51 → F8_t52 (new body)
    with BuildSketch(Plane.XZ.offset(36.2203178334)):
        with Locations((2.54, -13.4674325502)):
            Rectangle(F8_S51_W, F8_S51_H)
    extrude(amount=-F8_T52_DEPTH)

    # F8_s53 → F8_t54 (revolve, cut)
    with BuildSketch(Plane(origin=(5.08, -36.2203178334, -10.9274325502), x_dir=(0.7071067812, 0, 0.7071067812), z_dir=(-0.7071067812, 0, 0.7071067812))):
        with BuildLine():
            ThreePointArc((0, -5.08), (5.08, 0), (0, 5.08))
            Line((0, 5.08), (0, -5.08))
        make_face()
    revolve(axis=Axis((5.08, -36.2203178334, -10.9274325502), (0, 1, 0)), mode=Mode.SUBTRACT)


with BuildPart() as f1_6:
    add(f1_5.part)

    # F8_t49: cut F8_tool50
    add(f8_tool50.part, mode=Mode.SUBTRACT)


with BuildPart() as f8_tool56:
    # F8_s57 → F8_t58 (new body)
    with BuildSketch(Plane.XY.offset(42.4125674498)):
        with Locations((2.54, -2.54)):
            Rectangle(F8_S57_W, F8_S57_H)
    extrude(amount=F8_T58_DEPTH)

    # F8_s59 → F8_t60 (revolve, cut)
    with BuildSketch(Plane(origin=(5.08, -5.08, 42.4125674498), x_dir=(0.7071067812, -0.7071067812, 0), z_dir=(-0.7071067812, -0.7071067812, 0))):
        with BuildLine():
            ThreePointArc((0, -5.08), (5.08, 0), (0, 5.08))
            Line((0, 5.08), (0, -5.08))
        make_face()
    revolve(axis=Axis((5.08, -5.08, 42.4125674498), (0, 0, 1)), mode=Mode.SUBTRACT)


with BuildPart() as f1_7:
    add(f1_6.part)

    # F8_t55: cut F8_tool56
    add(f8_tool56.part, mode=Mode.SUBTRACT)


with BuildPart() as f8_tool62:
    # F8_s63 → F8_t64 (new body)
    with BuildSketch(Plane.XY.offset(42.4125674498)):
        with Locations((2.54, -73.66)):
            Rectangle(F8_S63_W, F8_S63_H)
    extrude(amount=F8_T64_DEPTH)

    # F8_s65 → F8_t66 (revolve, cut)
    with BuildSketch(Plane(origin=(5.08, -71.12, 42.4125674498), x_dir=(0.7071067812, 0.7071067812, 0), z_dir=(0.7071067812, -0.7071067812, 0))):
        with BuildLine():
            ThreePointArc((0, -5.08), (5.08, 0), (0, 5.08))
            Line((0, 5.08), (0, -5.08))
        make_face()
    revolve(axis=Axis((5.08, -71.12, 42.4125674498), (0, 0, 1)), mode=Mode.SUBTRACT)


with BuildPart() as f1_8:
    add(f1_7.part)

    # F8_t61: cut F8_tool62
    add(f8_tool62.part, mode=Mode.SUBTRACT)

    # F8_s67 → F8_t68 (revolve, cut)
    with BuildSketch(Plane.XY.offset(3.0425674498)):
        with BuildLine():
            ThreePointArc((28.2852255275, -31.1403178334), (24.693123079, -32.628215385), (23.2052255275, -36.2203178334))
            Line((23.2052255275, -36.2203178334), (23.2052255275, -31.1403178334))
            Line((23.2052255275, -31.1403178334), (28.2852255275, -31.1403178334))
        make_face()
    revolve(axis=Axis((12.7, -31.1403178334, 3.0425674498), (0, -1, 0)), mode=Mode.SUBTRACT)


with BuildPart() as f8_tool71:
    # F8_s72 → F8_t73 (new body)
    with BuildSketch(Plane.XY.offset(-10.9274325502)):
        with BuildLine():
            ThreePointArc((50.8, -36.2203178334), (49.3121024484, -32.628215385), (45.72, -31.1403178334))
            Line((45.72, -31.1403178334), (50.8, -31.1403178334))
            Line((50.8, -31.1403178334), (50.8, -36.2203178334))
        make_face()
    extrude(amount=F8_T73_DEPTH)

    split(bisect_by=Plane.XY.offset(22.0925674498), keep=Keep.TOP)


with BuildPart() as f8_tool75:
    # F8_s76 → F8_t77 (new body)
    with BuildSketch(Plane.XZ.offset(43.8403178334)):
        with BuildLine():
            ThreePointArc((50.8, 27.1725674498), (49.3121024484, 23.5804650014), (45.72, 22.0925674498))
            Line((45.72, 22.0925674498), (50.8, 22.0925674498))
            Line((50.8, 22.0925674498), (50.8, 27.1725674498))
        make_face()
    extrude(amount=-F8_T77_DEPTH)

    split(bisect_by=Plane.XZ.offset(31.1403178334), keep=Keep.TOP)


with BuildPart() as f8_tool71_1:
    add(f8_tool71.part)

    # F8_t79: intersect F8_tool75
    add(f8_tool75.part, mode=Mode.INTERSECT)


with BuildPart() as f1_9:
    add(f1_8.part)

    # F8_t69: cut F8_tool71
    add(f8_tool71_1.part, mode=Mode.SUBTRACT)


with BuildPart() as f8_tool82:
    # F8_s83 → F8_t84 (new body)
    with BuildSketch(Plane.XY.offset(34.7925674498)):
        with BuildLine():
            ThreePointArc((0, -36.2203178334), (1.4878975516, -32.628215385), (5.08, -31.1403178334))
            Line((5.08, -31.1403178334), (0, -31.1403178334))
            Line((0, -31.1403178334), (0, -36.2203178334))
        make_face()
    extrude(amount=-F8_T84_DEPTH)

    split(bisect_by=Plane.XY.offset(22.0925674498), keep=Keep.TOP)


with BuildPart() as f8_tool86:
    # F8_s87 → F8_t88 (new body)
    with BuildSketch(Plane.XZ.offset(5.08)):
        with BuildLine():
            ThreePointArc((0, 27.1725674498), (1.4878975516, 23.5804650014), (5.08, 22.0925674498))
            Line((5.08, 22.0925674498), (0, 22.0925674498))
            Line((0, 22.0925674498), (0, 27.1725674498))
        make_face()
    extrude(amount=F8_T88_DEPTH)

    split(bisect_by=Plane.XZ.offset(31.1403178334), keep=Keep.TOP)


with BuildPart() as f8_tool82_1:
    add(f8_tool82.part)

    # F8_t90: intersect F8_tool86
    add(f8_tool86.part, mode=Mode.INTERSECT)


with BuildPart() as f1_10:
    add(f1_9.part)

    # F8_t80: cut F8_tool82
    add(f8_tool82_1.part, mode=Mode.SUBTRACT)

    # F8_s92 → F8_t91 (cut)
    with BuildSketch(Plane.XY.offset(-10.9274325502)):
        with BuildLine():
            ThreePointArc((45.72, -56.5403178334), (49.3121024484, -55.0524202819), (50.8, -51.4603178334))
            Line((50.8, -51.4603178334), (50.8, -56.5403178334))
            Line((50.8, -56.5403178334), (45.72, -56.5403178334))
        make_face()
        with BuildLine():
            ThreePointArc((5.08, -56.5403178334), (1.4878975516, -55.0524202819), (0, -51.4603178334))
            Line((0, -51.4603178334), (0, -56.5403178334))
            Line((0, -56.5403178334), (5.08, -56.5403178334))
        make_face()
    extrude(amount=F8_T91_DEPTH, mode=Mode.SUBTRACT)

    # F8_s94 → F8_t93 (cut)
    with BuildSketch(Plane.XZ.offset(61.6203178334)):
        with BuildLine():
            ThreePointArc((45.72, 22.0925674498), (49.3121024484, 23.5804650014), (50.8, 27.1725674498))
            Line((50.8, 27.1725674498), (50.8, 22.0925674498))
            Line((50.8, 22.0925674498), (45.72, 22.0925674498))
        make_face()
        with BuildLine():
            ThreePointArc((5.08, 22.0925674498), (1.4878975516, 23.5804650014), (0, 27.1725674498))
            Line((0, 27.1725674498), (0, 22.0925674498))
            Line((0, 22.0925674498), (5.08, 22.0925674498))
        make_face()
    extrude(amount=F8_T93_DEPTH, mode=Mode.SUBTRACT)


with BuildPart() as f8_tool96:
    # F8_s97 → F8_t98 (new body)
    with BuildSketch(Plane.XZ.offset(51.4603178334)):
        with Locations((2.54, -13.4674325502)):
            Rectangle(F8_S97_W, F8_S97_H)
    extrude(amount=F8_T98_DEPTH)

    # F8_s99 → F8_t100 (revolve, cut)
    with BuildSketch(Plane(origin=(5.08, -51.4603178334, -10.9274325502), x_dir=(0.7071067812, 0, 0.7071067812), z_dir=(0.7071067812, 0, -0.7071067812))):
        with BuildLine():
            ThreePointArc((0, -5.08), (5.08, 0), (0, 5.08))
            Line((0, 5.08), (0, -5.08))
        make_face()
    revolve(axis=Axis((5.08, -51.4603178334, -10.9274325502), (0, -1, 0)), mode=Mode.SUBTRACT)


with BuildPart() as f1_11:
    add(f1_10.part)

    # F8_t95: cut F8_tool96
    add(f8_tool96.part, mode=Mode.SUBTRACT)


with BuildPart() as f8_tool102:
    # F8_s103 → F8_t104 (new body)
    with BuildSketch(Plane.XY.offset(27.1725674498)):
        with Locations((2.54, -73.66)):
            Rectangle(F8_S103_W, F8_S103_H)
    extrude(amount=-F8_T104_DEPTH)

    # F8_s105 → F8_t106 (revolve, cut)
    with BuildSketch(Plane(origin=(5.08, -71.12, 27.1725674498), x_dir=(0.7071067812, 0.7071067812, 0), z_dir=(-0.7071067812, 0.7071067812, 0))):
        with BuildLine():
            ThreePointArc((0, -5.08), (5.08, 0), (0, 5.08))
            Line((0, 5.08), (0, -5.08))
        make_face()
    revolve(axis=Axis((5.08, -71.12, 27.1725674498), (0, 0, -1)), mode=Mode.SUBTRACT)


with BuildPart() as f1_12:
    add(f1_11.part)

    # F8_t101: cut F8_tool102
    add(f8_tool102.part, mode=Mode.SUBTRACT)


with BuildPart() as f8_tool108:
    # F8_s109 → F8_t110 (new body)
    with BuildSketch(Plane.XY.offset(27.1725674498)):
        with Locations((48.26, -73.66)):
            Rectangle(F8_S109_W, F8_S109_H)
    extrude(amount=-F8_T110_DEPTH)

    # F8_s111 → F8_t112 (revolve, cut)
    with BuildSketch(Plane(origin=(45.72, -71.12, 27.1725674498), x_dir=(-0.7071067812, 0.7071067812, 0), z_dir=(-0.7071067812, -0.7071067812, 0))):
        with BuildLine():
            ThreePointArc((0, -5.08), (5.08, 0), (0, 5.08))
            Line((0, 5.08), (0, -5.08))
        make_face()
    revolve(axis=Axis((45.72, -71.12, 27.1725674498), (0, 0, -1)), mode=Mode.SUBTRACT)


with BuildPart() as f1_13:
    add(f1_12.part)

    # F8_t107: cut F8_tool108
    add(f8_tool108.part, mode=Mode.SUBTRACT)


with BuildPart() as f8_tool114:
    # F8_s115 → F8_t116 (new body)
    with BuildSketch(Plane.XZ.offset(51.4603178334)):
        with Locations((48.26, -13.4674325502)):
            Rectangle(F8_S115_W, F8_S115_H)
    extrude(amount=F8_T116_DEPTH)

    # F8_s117 → F8_t118 (revolve, cut)
    with BuildSketch(Plane(origin=(45.72, -51.4603178334, -10.9274325502), x_dir=(-0.7071067812, 0, 0.7071067812), z_dir=(0.7071067812, 0, 0.7071067812))):
        with BuildLine():
            ThreePointArc((0, -5.08), (5.08, 0), (0, 5.08))
            Line((0, 5.08), (0, -5.08))
        make_face()
    revolve(axis=Axis((45.72, -51.4603178334, -10.9274325502), (0, -1, 0)), mode=Mode.SUBTRACT)


with BuildPart() as f1_14:
    add(f1_13.part)

    # F8_t113: cut F8_tool114
    add(f8_tool114.part, mode=Mode.SUBTRACT)

    # F8_s119 → F8_t120 (revolve, cut)
    with BuildSketch(Plane.XZ.offset(61.6203178334)):
        with BuildLine():
            ThreePointArc((5.08, 22.0925674498), (1.4878975516, 23.5804650014), (0, 27.1725674498))
            Line((0, 27.1725674498), (0, 22.0925674498))
            Line((0, 22.0925674498), (5.08, 22.0925674498))
        make_face()
    revolve(axis=Axis((0, -61.6203178334, 17.0125674498), (-1, 0, 0)), revolution_arc=F8_T120_ANGLE, mode=Mode.SUBTRACT)

    # F8_s121 → F8_t122 (revolve, cut)
    with BuildSketch(Plane.XZ.offset(61.6203178334)):
        with BuildLine():
            ThreePointArc((45.72, 22.0925674498), (49.3121024484, 23.5804650014), (50.8, 27.1725674498))
            Line((50.8, 27.1725674498), (50.8, 22.0925674498))
            Line((50.8, 22.0925674498), (45.72, 22.0925674498))
        make_face()
    revolve(axis=Axis((50.8, -61.6203178334, 17.0125674498), (-1, 0, 0)), revolution_arc=F8_T122_ANGLE, mode=Mode.SUBTRACT)


solid = f1_14.part
